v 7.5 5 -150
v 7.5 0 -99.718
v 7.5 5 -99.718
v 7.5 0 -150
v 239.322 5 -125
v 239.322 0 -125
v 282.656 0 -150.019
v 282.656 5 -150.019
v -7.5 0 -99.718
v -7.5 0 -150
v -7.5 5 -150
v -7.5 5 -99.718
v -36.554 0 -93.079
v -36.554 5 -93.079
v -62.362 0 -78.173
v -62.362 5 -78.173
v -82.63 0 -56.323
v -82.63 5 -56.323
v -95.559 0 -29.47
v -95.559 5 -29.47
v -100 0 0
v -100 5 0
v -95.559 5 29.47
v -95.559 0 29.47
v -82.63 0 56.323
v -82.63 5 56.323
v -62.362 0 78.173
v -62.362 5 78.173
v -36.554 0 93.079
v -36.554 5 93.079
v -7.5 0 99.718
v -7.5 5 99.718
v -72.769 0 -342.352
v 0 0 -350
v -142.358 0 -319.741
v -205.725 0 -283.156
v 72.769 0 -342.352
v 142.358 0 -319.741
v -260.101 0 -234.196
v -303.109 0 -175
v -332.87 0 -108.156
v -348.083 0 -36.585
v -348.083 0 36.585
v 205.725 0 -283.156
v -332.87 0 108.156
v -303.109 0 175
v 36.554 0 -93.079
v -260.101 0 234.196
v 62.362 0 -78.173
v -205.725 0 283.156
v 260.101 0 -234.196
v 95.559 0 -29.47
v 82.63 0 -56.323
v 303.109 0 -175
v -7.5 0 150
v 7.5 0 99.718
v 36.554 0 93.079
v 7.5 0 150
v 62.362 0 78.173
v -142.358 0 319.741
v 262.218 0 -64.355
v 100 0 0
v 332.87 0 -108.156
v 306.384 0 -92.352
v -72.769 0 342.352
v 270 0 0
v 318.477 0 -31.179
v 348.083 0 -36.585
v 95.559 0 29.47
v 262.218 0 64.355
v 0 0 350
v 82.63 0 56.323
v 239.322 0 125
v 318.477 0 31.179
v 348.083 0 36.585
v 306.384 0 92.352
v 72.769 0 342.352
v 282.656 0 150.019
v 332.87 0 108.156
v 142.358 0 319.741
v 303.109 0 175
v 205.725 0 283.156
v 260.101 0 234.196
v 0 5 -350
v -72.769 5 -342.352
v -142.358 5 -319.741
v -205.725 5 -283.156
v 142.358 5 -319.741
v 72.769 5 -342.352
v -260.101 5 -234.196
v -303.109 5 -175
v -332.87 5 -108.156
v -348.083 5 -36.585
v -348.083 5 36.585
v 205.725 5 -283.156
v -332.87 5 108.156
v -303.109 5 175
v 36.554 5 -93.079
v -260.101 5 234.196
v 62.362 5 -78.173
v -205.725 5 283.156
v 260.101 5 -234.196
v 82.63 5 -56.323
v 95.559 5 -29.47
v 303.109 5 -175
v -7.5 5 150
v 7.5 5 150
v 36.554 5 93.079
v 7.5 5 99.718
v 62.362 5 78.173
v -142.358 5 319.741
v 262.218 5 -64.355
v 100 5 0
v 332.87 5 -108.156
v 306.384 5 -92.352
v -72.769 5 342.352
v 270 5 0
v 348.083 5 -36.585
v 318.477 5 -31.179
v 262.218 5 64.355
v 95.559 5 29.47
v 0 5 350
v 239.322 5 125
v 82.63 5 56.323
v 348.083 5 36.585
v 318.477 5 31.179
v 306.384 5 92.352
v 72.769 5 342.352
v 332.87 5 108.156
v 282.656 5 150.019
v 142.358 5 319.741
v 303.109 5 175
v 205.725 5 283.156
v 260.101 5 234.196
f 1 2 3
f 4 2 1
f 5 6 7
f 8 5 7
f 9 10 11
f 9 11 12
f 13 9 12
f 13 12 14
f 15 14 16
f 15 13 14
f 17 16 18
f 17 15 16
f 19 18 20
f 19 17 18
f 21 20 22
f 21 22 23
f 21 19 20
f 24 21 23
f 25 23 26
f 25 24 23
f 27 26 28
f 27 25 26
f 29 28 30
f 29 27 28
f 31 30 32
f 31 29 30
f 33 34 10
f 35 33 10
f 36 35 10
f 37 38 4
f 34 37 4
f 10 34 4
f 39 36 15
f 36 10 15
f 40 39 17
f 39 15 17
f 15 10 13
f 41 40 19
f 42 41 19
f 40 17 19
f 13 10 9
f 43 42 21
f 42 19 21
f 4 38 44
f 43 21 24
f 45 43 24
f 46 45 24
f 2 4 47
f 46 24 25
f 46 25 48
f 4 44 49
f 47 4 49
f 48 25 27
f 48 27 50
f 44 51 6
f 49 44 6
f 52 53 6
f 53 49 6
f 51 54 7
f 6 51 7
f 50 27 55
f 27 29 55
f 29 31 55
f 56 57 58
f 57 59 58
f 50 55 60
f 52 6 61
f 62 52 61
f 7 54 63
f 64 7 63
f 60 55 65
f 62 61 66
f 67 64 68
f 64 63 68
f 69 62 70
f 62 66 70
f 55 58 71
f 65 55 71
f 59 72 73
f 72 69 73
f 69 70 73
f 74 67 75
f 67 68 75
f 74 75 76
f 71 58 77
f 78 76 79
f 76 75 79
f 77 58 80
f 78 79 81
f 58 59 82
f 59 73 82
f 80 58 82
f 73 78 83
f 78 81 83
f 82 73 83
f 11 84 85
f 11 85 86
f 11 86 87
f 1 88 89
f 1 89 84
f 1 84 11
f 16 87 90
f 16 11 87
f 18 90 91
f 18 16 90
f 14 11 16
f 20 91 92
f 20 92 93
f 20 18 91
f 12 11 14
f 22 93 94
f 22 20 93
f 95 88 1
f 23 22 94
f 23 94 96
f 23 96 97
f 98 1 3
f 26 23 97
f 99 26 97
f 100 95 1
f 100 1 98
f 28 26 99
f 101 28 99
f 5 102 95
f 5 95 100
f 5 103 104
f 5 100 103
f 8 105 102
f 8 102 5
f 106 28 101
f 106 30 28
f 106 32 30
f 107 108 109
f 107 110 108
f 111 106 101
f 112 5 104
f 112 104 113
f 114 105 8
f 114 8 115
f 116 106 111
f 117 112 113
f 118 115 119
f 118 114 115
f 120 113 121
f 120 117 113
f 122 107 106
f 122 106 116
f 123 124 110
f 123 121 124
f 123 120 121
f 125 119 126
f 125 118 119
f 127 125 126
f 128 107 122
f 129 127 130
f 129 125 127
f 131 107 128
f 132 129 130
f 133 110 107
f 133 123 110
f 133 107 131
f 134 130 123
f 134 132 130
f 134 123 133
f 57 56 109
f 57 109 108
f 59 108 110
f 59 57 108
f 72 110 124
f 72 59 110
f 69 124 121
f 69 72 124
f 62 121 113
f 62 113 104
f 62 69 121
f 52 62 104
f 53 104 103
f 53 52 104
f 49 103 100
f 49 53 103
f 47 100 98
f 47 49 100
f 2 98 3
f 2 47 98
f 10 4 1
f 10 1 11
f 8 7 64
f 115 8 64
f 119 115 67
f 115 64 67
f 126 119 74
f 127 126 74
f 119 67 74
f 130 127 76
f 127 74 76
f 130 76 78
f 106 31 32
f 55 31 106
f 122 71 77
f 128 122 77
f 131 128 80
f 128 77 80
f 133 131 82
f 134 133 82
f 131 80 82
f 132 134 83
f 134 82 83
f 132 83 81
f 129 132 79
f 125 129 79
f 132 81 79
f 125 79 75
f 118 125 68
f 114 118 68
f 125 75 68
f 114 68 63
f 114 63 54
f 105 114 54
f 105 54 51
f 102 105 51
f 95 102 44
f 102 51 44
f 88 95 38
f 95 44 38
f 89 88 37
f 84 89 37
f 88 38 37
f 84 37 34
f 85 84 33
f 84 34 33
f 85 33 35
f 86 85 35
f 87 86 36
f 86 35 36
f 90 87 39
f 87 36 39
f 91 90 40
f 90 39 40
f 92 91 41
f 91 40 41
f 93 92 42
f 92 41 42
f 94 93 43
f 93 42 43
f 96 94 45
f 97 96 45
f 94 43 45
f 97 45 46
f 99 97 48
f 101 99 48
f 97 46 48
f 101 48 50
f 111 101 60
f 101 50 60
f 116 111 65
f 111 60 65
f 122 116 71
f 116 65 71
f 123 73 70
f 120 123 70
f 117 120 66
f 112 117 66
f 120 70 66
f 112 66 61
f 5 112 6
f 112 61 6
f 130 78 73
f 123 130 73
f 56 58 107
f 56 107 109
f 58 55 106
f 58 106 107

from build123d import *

# Parameters (mm, degrees)
IZIM1_R                     = 350
Y_KSEKLIK_EKSTR_ZYON2_DEPTH = 5


with BuildPart() as part:
    # Çizim1 → Yükseklik-Ekstrüzyon2 (new body)
    with BuildSketch(Plane(origin=(0, 0, 0), x_dir=(1, 0, 0), z_dir=(0, 1, 0))):
        with Locations(Location((0, 0, 0), (0, 0, 270))):
            Circle(IZIM1_R)
        with BuildLine():
            Line((7.5, -150), (7.5, -99.718353376))
            ThreePointArc((7.5, -99.718353376), (100, 0), (7.5, 99.718353376))
            Line((7.5, 99.718353376), (7.5, 150))
            Line((7.5, 150), (-7.5, 150))
            Line((-7.5, 150), (-7.5, 99.718353376))
            ThreePointArc((-7.5, 99.718353376), (-100, 0), (-7.5, -99.718353376))
            Line((-7.5, -99.718353376), (-7.5, -150))
            Line((-7.5, -150), (7.5, -150))
        make_face(mode=Mode.SUBTRACT)
        with BuildLine():
            Line((239.321958875, 125), (282.655877073, 150.018849336))
            ThreePointArc((282.655877073, 150.018849336), (320, 0), (282.655877073, -150.018849336))
            Line((282.655877073, -150.018849336), (239.321958875, -125))
            ThreePointArc((239.321958875, -125), (270, 0), (239.321958875, 125))
        make_face(mode=Mode.SUBTRACT)
    extrude(amount=Y_KSEKLIK_EKSTR_ZYON2_DEPTH)


solid = part.part
